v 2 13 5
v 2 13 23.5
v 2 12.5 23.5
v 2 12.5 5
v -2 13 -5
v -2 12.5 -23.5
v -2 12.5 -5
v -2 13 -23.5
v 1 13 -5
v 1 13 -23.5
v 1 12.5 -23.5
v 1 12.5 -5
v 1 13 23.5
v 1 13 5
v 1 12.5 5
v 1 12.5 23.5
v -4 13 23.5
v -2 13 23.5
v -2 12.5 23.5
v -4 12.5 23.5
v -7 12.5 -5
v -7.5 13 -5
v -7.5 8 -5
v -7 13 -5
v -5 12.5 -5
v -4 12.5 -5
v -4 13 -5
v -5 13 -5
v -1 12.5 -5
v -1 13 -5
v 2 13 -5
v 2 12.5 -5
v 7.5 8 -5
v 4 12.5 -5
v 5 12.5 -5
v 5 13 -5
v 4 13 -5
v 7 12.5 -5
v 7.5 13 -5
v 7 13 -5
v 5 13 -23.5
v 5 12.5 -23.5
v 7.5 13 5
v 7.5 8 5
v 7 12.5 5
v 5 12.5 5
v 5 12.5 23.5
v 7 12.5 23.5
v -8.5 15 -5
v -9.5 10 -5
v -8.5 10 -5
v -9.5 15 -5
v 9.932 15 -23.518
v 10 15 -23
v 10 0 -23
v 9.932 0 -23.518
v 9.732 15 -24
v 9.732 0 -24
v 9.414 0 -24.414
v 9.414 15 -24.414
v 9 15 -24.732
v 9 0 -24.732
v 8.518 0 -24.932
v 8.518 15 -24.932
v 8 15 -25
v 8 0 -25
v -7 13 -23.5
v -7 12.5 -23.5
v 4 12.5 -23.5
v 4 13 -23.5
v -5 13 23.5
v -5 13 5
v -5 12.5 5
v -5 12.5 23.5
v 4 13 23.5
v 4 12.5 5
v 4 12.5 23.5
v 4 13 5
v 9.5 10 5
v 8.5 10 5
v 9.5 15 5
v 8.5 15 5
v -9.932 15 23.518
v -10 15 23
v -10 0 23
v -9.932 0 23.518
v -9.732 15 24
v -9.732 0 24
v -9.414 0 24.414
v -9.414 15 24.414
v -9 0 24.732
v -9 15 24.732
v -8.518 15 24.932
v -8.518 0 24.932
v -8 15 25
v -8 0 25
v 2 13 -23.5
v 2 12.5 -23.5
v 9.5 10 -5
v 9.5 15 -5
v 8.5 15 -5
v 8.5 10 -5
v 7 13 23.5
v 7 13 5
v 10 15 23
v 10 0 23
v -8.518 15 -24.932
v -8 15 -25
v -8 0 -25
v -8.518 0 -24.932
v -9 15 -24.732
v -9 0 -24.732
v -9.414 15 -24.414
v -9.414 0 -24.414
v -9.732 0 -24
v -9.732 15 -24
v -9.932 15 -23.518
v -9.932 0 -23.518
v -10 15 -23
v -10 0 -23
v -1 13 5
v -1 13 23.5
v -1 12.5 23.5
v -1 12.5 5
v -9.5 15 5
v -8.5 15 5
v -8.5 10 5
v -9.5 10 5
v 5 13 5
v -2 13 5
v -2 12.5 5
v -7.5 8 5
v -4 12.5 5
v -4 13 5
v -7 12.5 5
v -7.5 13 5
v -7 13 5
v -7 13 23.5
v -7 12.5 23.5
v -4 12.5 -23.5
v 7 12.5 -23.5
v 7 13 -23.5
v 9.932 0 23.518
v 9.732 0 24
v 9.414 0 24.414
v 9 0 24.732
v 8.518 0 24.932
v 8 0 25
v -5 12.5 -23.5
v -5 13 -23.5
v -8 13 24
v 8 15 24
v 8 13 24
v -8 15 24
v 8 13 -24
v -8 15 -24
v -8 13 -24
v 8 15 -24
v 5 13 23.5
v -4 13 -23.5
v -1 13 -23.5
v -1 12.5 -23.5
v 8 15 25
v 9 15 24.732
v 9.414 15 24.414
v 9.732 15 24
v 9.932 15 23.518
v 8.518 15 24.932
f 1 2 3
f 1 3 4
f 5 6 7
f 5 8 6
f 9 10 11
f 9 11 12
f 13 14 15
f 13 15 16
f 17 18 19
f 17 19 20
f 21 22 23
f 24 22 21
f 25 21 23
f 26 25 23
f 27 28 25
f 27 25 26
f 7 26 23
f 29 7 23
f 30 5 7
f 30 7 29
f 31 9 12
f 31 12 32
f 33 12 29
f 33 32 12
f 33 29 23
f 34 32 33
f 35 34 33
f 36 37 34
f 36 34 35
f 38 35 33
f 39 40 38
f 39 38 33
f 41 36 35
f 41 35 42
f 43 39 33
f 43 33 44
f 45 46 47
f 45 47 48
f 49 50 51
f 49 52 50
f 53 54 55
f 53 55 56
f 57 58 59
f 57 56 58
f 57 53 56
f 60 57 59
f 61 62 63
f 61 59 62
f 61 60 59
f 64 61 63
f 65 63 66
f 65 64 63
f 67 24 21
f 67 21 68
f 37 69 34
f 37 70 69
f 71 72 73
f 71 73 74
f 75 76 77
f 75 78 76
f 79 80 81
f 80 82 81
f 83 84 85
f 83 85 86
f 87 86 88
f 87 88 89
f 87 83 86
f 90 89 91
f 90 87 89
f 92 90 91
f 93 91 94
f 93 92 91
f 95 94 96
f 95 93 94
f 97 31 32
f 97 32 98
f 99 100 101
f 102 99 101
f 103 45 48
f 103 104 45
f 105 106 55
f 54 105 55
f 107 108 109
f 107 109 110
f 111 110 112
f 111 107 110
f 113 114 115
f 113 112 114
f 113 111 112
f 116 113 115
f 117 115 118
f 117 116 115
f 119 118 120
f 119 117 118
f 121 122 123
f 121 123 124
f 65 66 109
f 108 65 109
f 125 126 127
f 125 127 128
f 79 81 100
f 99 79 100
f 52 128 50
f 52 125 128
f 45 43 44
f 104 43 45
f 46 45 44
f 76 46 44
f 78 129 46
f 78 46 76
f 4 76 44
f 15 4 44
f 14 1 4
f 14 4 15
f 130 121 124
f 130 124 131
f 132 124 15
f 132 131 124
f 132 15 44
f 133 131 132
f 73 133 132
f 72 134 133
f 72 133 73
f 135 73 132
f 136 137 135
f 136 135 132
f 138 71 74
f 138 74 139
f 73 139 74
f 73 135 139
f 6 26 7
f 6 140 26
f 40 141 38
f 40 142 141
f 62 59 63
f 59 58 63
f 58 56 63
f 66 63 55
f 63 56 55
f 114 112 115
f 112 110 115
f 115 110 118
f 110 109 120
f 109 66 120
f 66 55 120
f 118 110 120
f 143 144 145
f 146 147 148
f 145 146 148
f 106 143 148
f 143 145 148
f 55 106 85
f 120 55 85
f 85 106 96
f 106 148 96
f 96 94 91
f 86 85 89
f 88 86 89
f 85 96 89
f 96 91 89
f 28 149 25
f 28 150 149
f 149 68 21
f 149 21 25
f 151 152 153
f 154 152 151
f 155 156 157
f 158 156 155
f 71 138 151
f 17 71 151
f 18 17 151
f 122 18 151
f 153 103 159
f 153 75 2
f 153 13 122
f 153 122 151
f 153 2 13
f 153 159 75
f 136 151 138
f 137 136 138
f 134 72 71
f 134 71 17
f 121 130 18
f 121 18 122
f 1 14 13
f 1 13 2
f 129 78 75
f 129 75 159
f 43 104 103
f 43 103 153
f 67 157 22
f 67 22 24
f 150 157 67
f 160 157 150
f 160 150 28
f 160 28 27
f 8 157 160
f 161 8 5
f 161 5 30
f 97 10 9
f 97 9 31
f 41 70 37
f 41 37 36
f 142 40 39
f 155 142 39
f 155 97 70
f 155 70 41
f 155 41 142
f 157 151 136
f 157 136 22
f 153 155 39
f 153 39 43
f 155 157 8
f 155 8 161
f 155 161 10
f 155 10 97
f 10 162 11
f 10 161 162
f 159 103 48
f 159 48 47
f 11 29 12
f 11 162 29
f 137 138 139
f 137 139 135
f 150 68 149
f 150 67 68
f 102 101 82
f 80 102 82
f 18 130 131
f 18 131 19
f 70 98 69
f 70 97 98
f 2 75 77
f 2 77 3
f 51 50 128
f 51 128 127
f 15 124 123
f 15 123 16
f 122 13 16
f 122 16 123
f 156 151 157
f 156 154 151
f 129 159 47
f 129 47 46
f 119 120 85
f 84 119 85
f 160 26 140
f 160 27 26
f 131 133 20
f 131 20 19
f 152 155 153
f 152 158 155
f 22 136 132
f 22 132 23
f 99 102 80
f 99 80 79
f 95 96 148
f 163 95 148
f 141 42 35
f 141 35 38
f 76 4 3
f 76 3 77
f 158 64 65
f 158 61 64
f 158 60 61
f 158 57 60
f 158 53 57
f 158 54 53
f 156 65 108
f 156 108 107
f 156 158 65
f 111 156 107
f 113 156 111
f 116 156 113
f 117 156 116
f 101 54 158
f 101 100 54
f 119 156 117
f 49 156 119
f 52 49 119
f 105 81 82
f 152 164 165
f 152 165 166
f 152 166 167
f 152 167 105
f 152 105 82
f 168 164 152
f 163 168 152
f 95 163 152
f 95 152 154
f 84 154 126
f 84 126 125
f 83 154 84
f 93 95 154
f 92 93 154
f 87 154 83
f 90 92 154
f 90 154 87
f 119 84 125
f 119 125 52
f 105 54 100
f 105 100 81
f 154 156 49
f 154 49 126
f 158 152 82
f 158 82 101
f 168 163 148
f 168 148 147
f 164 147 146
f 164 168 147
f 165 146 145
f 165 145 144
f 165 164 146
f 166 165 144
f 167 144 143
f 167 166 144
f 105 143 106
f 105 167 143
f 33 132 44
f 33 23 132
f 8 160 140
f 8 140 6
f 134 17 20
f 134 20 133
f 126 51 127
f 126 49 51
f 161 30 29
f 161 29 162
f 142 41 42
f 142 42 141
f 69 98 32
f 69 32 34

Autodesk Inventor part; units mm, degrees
ref_plane "YZ Plane" through (0, 0, 0) normal (1, 0, 0) x (0, 1, 0)
ref_plane "XZ Plane" through (0, 0, 0) normal (0, 1, 0) x (-1, 0, 0)
ref_plane "XY Plane" through (0, 0, 0) normal (0, 0, 1) x (1, 0, 0)
sketch "Skizze1" plane through (0, 0, 0) normal (0, 1, 0) x (-1, 0, 0)
  line L0 (10, 25) -> (-10, 25)
  line L1 (-10, 25) -> (-10, -25)
  line L2 (-10, -25) -> (10, -25)
  line L3 (10, -25) -> (10, 25)
  point P0 (0, 0)
  dimension "d0" = 50
  dimension "d1" = 20
  dimension "d20" = 10
  dimension "d21" = 25
extrude "Extrusion1" add sketch "Skizze1" along normal blind 15
sketch "Skizze3" plane through (0, 15, 0) normal (0, 1, 0) x (1, 0, 0)
  line L0 (-8, 24) -> (8, 24)
  line L1 (8, 24) -> (8, -24)
  line L2 (8, -24) -> (-8, -24)
  line L3 (-8, -24) -> (-8, 24)
  line L4 (10, 25) -> (-10, 25) projected
  line L5 (-10, -25) -> (10, -25) projected
  line L6 (10, -25) -> (10, 25) projected
  line L7 (-10, 25) -> (-10, -25) projected
  point P0 (0, 0)
  dimension "d4" = 1
  dimension "d5" = 1
  dimension "d6" = 2
  dimension "d7" = 2
extrude "Extrusion2" cut sketch "Skizze3" against normal blind 2 contours L0 L1 L2 L3
sketch "Skizze4" plane through (0, 13, 0) normal (0, 1, 0) x (1, 0, 0)
  line L0 (-1, 23.5) -> (1, 23.5)
  line L1 (1, 23.5) -> (1, -23.5)
  line L2 (1, -23.5) -> (-1, -23.5)
  line L3 (-1, -23.5) -> (-1, 23.5)
  line L4 (-8, 24) -> (8, 24) projected
  line L5 (8, -24) -> (-8, -24) projected
  line L6 (2, 23.5) -> (4, 23.5)
  line L7 (4, 23.5) -> (4, -23.5)
  line L8 (4, -23.5) -> (2, -23.5)
  line L9 (2, -23.5) -> (2, 23.5)
  line L10 (-7, 23.5) -> (-5, 23.5)
  line L11 (-5, 23.5) -> (-5, -23.5)
  line L12 (-5, -23.5) -> (-7, -23.5)
  line L13 (-7, -23.5) -> (-7, 23.5)
  line L14 (-4, 23.5) -> (-2, 23.5)
  line L15 (-2, 23.5) -> (-2, -23.5)
  line L16 (-2, -23.5) -> (-4, -23.5)
  line L17 (-4, -23.5) -> (-4, 23.5)
  line L18 (5, 23.5) -> (7, 23.5)
  line L19 (7, 23.5) -> (7, -23.5)
  line L20 (7, -23.5) -> (5, -23.5)
  line L21 (5, -23.5) -> (5, 23.5)
  line L22 (-8, -24) -> (-8, 24) projected
  line L23 (8, 24) -> (8, -24) projected
  point P0 (0, 0)
  point P1 (0, -23.5)
  point P2 (0, -24)
  point P3 (6, 23.5)
  dimension "d10" = 2
  dimension "d11" = 0.5
  dimension "d12" = 0.5
  dimension "d33" = 2
  dimension "d34" = 2
  dimension "d35" = 2
  dimension "d36" = 2
  dimension "d37" = 1
  dimension "d38" = 1
  dimension "d39" = 1
  dimension "d40" = 1
  dimension "d41" = 1
  dimension "d42" = 1
  dimension "d50" = 47
  dimension "d51" = 0.5
  dimension "d52" = 0.5
  dimension "d53" = 0.5
  dimension "d54" = 0.5
  dimension "d55" = 47
sketch "Skizze5" plane through (0, 0, 0) normal (1, 0, 0) x (0, 1, 0)
  point P0 (0, 0)
extrude "Extrusion3" cut sketch "Skizze4" against normal blind 0.5 contours L0 L1 L2 L3 | L6 L7 L8 L9 | L10 L11 L12 L13 | L14 L15 L16 L17 | L18 L19 L20 L21
sketch "Skizze6" plane through (0, 13, 0) normal (0, 1, 0) x (1, 0, 0)
  line L0 (8, 24) -> (8, -24) projected
  point P0 (0, 0)
  point P1 (4.1748, -18.2105)
  point P2 (-0.1937, 19)
  point P3 (8, 0)
sketch "Skizze8" plane through (0, 15, 0) normal (0, 1, 0) x (1, 0, 0)
  point P0 (0, 0)
sketch "Skizze9" plane through (0, 15, 0) normal (0, 1, 0) x (1, 0, 0)
  line L0 (9.5, 5) -> (8.5, 5)
  line L1 (8.5, 5) -> (8.5, -5)
  line L2 (8.5, -5) -> (9.5, -5)
  line L3 (9.5, -5) -> (9.5, 5)
  line L4 (8, 24) -> (8, -24) construction
  line L5 (-8.5, -5) -> (-9.5, -5)
  line L6 (-9.5, -5) -> (-9.5, 5)
  line L7 (-9.5, 5) -> (-8.5, 5)
  line L8 (-8.5, 5) -> (-8.5, -5)
  line L9 (-10, 25) -> (-10, -25) projected
  point P0 (0, 0)
  point P1 (9, -5)
  point P2 (9.5, 0)
  dimension "d23" = 10
  dimension "d24" = 0.5
  dimension "d25" = 1
  dimension "d26" = 0
  dimension "d29" = 1
  dimension "d30" = 0.5
extrude "Extrusion5" cut sketch "Skizze9" against normal blind 5
sketch "Skizze10" plane through (0, 13, 0) normal (0, 1, 0) x (1, 0, 0)
  line L0 (-7.5, 5) -> (7.5, 5)
  line L1 (7.5, 5) -> (7.5, -5)
  line L2 (7.5, -5) -> (-7.5, -5)
  line L3 (-7.5, -5) -> (-7.5, 5)
  line L4 (-8, -24) -> (-8, 24) projected
  line L5 (8, 24) -> (8, -24) projected
  line L6 (-8, 24) -> (8, 24) projected
  point P0 (0, 0)
  dimension "d43" = 0.5
  dimension "d44" = 0.5
  dimension "d45" = 10
  dimension "d46" = 19
extrude "Extrusion6" cut sketch "Skizze10" against normal blind 5
fillet "Rundung1" radius 2 4 edges at (10, 7.5, 25) (-10, 7.5, 25) (10, 7.5, -25) (-10, 7.5, -25)
properties part number "Nadelbox"
